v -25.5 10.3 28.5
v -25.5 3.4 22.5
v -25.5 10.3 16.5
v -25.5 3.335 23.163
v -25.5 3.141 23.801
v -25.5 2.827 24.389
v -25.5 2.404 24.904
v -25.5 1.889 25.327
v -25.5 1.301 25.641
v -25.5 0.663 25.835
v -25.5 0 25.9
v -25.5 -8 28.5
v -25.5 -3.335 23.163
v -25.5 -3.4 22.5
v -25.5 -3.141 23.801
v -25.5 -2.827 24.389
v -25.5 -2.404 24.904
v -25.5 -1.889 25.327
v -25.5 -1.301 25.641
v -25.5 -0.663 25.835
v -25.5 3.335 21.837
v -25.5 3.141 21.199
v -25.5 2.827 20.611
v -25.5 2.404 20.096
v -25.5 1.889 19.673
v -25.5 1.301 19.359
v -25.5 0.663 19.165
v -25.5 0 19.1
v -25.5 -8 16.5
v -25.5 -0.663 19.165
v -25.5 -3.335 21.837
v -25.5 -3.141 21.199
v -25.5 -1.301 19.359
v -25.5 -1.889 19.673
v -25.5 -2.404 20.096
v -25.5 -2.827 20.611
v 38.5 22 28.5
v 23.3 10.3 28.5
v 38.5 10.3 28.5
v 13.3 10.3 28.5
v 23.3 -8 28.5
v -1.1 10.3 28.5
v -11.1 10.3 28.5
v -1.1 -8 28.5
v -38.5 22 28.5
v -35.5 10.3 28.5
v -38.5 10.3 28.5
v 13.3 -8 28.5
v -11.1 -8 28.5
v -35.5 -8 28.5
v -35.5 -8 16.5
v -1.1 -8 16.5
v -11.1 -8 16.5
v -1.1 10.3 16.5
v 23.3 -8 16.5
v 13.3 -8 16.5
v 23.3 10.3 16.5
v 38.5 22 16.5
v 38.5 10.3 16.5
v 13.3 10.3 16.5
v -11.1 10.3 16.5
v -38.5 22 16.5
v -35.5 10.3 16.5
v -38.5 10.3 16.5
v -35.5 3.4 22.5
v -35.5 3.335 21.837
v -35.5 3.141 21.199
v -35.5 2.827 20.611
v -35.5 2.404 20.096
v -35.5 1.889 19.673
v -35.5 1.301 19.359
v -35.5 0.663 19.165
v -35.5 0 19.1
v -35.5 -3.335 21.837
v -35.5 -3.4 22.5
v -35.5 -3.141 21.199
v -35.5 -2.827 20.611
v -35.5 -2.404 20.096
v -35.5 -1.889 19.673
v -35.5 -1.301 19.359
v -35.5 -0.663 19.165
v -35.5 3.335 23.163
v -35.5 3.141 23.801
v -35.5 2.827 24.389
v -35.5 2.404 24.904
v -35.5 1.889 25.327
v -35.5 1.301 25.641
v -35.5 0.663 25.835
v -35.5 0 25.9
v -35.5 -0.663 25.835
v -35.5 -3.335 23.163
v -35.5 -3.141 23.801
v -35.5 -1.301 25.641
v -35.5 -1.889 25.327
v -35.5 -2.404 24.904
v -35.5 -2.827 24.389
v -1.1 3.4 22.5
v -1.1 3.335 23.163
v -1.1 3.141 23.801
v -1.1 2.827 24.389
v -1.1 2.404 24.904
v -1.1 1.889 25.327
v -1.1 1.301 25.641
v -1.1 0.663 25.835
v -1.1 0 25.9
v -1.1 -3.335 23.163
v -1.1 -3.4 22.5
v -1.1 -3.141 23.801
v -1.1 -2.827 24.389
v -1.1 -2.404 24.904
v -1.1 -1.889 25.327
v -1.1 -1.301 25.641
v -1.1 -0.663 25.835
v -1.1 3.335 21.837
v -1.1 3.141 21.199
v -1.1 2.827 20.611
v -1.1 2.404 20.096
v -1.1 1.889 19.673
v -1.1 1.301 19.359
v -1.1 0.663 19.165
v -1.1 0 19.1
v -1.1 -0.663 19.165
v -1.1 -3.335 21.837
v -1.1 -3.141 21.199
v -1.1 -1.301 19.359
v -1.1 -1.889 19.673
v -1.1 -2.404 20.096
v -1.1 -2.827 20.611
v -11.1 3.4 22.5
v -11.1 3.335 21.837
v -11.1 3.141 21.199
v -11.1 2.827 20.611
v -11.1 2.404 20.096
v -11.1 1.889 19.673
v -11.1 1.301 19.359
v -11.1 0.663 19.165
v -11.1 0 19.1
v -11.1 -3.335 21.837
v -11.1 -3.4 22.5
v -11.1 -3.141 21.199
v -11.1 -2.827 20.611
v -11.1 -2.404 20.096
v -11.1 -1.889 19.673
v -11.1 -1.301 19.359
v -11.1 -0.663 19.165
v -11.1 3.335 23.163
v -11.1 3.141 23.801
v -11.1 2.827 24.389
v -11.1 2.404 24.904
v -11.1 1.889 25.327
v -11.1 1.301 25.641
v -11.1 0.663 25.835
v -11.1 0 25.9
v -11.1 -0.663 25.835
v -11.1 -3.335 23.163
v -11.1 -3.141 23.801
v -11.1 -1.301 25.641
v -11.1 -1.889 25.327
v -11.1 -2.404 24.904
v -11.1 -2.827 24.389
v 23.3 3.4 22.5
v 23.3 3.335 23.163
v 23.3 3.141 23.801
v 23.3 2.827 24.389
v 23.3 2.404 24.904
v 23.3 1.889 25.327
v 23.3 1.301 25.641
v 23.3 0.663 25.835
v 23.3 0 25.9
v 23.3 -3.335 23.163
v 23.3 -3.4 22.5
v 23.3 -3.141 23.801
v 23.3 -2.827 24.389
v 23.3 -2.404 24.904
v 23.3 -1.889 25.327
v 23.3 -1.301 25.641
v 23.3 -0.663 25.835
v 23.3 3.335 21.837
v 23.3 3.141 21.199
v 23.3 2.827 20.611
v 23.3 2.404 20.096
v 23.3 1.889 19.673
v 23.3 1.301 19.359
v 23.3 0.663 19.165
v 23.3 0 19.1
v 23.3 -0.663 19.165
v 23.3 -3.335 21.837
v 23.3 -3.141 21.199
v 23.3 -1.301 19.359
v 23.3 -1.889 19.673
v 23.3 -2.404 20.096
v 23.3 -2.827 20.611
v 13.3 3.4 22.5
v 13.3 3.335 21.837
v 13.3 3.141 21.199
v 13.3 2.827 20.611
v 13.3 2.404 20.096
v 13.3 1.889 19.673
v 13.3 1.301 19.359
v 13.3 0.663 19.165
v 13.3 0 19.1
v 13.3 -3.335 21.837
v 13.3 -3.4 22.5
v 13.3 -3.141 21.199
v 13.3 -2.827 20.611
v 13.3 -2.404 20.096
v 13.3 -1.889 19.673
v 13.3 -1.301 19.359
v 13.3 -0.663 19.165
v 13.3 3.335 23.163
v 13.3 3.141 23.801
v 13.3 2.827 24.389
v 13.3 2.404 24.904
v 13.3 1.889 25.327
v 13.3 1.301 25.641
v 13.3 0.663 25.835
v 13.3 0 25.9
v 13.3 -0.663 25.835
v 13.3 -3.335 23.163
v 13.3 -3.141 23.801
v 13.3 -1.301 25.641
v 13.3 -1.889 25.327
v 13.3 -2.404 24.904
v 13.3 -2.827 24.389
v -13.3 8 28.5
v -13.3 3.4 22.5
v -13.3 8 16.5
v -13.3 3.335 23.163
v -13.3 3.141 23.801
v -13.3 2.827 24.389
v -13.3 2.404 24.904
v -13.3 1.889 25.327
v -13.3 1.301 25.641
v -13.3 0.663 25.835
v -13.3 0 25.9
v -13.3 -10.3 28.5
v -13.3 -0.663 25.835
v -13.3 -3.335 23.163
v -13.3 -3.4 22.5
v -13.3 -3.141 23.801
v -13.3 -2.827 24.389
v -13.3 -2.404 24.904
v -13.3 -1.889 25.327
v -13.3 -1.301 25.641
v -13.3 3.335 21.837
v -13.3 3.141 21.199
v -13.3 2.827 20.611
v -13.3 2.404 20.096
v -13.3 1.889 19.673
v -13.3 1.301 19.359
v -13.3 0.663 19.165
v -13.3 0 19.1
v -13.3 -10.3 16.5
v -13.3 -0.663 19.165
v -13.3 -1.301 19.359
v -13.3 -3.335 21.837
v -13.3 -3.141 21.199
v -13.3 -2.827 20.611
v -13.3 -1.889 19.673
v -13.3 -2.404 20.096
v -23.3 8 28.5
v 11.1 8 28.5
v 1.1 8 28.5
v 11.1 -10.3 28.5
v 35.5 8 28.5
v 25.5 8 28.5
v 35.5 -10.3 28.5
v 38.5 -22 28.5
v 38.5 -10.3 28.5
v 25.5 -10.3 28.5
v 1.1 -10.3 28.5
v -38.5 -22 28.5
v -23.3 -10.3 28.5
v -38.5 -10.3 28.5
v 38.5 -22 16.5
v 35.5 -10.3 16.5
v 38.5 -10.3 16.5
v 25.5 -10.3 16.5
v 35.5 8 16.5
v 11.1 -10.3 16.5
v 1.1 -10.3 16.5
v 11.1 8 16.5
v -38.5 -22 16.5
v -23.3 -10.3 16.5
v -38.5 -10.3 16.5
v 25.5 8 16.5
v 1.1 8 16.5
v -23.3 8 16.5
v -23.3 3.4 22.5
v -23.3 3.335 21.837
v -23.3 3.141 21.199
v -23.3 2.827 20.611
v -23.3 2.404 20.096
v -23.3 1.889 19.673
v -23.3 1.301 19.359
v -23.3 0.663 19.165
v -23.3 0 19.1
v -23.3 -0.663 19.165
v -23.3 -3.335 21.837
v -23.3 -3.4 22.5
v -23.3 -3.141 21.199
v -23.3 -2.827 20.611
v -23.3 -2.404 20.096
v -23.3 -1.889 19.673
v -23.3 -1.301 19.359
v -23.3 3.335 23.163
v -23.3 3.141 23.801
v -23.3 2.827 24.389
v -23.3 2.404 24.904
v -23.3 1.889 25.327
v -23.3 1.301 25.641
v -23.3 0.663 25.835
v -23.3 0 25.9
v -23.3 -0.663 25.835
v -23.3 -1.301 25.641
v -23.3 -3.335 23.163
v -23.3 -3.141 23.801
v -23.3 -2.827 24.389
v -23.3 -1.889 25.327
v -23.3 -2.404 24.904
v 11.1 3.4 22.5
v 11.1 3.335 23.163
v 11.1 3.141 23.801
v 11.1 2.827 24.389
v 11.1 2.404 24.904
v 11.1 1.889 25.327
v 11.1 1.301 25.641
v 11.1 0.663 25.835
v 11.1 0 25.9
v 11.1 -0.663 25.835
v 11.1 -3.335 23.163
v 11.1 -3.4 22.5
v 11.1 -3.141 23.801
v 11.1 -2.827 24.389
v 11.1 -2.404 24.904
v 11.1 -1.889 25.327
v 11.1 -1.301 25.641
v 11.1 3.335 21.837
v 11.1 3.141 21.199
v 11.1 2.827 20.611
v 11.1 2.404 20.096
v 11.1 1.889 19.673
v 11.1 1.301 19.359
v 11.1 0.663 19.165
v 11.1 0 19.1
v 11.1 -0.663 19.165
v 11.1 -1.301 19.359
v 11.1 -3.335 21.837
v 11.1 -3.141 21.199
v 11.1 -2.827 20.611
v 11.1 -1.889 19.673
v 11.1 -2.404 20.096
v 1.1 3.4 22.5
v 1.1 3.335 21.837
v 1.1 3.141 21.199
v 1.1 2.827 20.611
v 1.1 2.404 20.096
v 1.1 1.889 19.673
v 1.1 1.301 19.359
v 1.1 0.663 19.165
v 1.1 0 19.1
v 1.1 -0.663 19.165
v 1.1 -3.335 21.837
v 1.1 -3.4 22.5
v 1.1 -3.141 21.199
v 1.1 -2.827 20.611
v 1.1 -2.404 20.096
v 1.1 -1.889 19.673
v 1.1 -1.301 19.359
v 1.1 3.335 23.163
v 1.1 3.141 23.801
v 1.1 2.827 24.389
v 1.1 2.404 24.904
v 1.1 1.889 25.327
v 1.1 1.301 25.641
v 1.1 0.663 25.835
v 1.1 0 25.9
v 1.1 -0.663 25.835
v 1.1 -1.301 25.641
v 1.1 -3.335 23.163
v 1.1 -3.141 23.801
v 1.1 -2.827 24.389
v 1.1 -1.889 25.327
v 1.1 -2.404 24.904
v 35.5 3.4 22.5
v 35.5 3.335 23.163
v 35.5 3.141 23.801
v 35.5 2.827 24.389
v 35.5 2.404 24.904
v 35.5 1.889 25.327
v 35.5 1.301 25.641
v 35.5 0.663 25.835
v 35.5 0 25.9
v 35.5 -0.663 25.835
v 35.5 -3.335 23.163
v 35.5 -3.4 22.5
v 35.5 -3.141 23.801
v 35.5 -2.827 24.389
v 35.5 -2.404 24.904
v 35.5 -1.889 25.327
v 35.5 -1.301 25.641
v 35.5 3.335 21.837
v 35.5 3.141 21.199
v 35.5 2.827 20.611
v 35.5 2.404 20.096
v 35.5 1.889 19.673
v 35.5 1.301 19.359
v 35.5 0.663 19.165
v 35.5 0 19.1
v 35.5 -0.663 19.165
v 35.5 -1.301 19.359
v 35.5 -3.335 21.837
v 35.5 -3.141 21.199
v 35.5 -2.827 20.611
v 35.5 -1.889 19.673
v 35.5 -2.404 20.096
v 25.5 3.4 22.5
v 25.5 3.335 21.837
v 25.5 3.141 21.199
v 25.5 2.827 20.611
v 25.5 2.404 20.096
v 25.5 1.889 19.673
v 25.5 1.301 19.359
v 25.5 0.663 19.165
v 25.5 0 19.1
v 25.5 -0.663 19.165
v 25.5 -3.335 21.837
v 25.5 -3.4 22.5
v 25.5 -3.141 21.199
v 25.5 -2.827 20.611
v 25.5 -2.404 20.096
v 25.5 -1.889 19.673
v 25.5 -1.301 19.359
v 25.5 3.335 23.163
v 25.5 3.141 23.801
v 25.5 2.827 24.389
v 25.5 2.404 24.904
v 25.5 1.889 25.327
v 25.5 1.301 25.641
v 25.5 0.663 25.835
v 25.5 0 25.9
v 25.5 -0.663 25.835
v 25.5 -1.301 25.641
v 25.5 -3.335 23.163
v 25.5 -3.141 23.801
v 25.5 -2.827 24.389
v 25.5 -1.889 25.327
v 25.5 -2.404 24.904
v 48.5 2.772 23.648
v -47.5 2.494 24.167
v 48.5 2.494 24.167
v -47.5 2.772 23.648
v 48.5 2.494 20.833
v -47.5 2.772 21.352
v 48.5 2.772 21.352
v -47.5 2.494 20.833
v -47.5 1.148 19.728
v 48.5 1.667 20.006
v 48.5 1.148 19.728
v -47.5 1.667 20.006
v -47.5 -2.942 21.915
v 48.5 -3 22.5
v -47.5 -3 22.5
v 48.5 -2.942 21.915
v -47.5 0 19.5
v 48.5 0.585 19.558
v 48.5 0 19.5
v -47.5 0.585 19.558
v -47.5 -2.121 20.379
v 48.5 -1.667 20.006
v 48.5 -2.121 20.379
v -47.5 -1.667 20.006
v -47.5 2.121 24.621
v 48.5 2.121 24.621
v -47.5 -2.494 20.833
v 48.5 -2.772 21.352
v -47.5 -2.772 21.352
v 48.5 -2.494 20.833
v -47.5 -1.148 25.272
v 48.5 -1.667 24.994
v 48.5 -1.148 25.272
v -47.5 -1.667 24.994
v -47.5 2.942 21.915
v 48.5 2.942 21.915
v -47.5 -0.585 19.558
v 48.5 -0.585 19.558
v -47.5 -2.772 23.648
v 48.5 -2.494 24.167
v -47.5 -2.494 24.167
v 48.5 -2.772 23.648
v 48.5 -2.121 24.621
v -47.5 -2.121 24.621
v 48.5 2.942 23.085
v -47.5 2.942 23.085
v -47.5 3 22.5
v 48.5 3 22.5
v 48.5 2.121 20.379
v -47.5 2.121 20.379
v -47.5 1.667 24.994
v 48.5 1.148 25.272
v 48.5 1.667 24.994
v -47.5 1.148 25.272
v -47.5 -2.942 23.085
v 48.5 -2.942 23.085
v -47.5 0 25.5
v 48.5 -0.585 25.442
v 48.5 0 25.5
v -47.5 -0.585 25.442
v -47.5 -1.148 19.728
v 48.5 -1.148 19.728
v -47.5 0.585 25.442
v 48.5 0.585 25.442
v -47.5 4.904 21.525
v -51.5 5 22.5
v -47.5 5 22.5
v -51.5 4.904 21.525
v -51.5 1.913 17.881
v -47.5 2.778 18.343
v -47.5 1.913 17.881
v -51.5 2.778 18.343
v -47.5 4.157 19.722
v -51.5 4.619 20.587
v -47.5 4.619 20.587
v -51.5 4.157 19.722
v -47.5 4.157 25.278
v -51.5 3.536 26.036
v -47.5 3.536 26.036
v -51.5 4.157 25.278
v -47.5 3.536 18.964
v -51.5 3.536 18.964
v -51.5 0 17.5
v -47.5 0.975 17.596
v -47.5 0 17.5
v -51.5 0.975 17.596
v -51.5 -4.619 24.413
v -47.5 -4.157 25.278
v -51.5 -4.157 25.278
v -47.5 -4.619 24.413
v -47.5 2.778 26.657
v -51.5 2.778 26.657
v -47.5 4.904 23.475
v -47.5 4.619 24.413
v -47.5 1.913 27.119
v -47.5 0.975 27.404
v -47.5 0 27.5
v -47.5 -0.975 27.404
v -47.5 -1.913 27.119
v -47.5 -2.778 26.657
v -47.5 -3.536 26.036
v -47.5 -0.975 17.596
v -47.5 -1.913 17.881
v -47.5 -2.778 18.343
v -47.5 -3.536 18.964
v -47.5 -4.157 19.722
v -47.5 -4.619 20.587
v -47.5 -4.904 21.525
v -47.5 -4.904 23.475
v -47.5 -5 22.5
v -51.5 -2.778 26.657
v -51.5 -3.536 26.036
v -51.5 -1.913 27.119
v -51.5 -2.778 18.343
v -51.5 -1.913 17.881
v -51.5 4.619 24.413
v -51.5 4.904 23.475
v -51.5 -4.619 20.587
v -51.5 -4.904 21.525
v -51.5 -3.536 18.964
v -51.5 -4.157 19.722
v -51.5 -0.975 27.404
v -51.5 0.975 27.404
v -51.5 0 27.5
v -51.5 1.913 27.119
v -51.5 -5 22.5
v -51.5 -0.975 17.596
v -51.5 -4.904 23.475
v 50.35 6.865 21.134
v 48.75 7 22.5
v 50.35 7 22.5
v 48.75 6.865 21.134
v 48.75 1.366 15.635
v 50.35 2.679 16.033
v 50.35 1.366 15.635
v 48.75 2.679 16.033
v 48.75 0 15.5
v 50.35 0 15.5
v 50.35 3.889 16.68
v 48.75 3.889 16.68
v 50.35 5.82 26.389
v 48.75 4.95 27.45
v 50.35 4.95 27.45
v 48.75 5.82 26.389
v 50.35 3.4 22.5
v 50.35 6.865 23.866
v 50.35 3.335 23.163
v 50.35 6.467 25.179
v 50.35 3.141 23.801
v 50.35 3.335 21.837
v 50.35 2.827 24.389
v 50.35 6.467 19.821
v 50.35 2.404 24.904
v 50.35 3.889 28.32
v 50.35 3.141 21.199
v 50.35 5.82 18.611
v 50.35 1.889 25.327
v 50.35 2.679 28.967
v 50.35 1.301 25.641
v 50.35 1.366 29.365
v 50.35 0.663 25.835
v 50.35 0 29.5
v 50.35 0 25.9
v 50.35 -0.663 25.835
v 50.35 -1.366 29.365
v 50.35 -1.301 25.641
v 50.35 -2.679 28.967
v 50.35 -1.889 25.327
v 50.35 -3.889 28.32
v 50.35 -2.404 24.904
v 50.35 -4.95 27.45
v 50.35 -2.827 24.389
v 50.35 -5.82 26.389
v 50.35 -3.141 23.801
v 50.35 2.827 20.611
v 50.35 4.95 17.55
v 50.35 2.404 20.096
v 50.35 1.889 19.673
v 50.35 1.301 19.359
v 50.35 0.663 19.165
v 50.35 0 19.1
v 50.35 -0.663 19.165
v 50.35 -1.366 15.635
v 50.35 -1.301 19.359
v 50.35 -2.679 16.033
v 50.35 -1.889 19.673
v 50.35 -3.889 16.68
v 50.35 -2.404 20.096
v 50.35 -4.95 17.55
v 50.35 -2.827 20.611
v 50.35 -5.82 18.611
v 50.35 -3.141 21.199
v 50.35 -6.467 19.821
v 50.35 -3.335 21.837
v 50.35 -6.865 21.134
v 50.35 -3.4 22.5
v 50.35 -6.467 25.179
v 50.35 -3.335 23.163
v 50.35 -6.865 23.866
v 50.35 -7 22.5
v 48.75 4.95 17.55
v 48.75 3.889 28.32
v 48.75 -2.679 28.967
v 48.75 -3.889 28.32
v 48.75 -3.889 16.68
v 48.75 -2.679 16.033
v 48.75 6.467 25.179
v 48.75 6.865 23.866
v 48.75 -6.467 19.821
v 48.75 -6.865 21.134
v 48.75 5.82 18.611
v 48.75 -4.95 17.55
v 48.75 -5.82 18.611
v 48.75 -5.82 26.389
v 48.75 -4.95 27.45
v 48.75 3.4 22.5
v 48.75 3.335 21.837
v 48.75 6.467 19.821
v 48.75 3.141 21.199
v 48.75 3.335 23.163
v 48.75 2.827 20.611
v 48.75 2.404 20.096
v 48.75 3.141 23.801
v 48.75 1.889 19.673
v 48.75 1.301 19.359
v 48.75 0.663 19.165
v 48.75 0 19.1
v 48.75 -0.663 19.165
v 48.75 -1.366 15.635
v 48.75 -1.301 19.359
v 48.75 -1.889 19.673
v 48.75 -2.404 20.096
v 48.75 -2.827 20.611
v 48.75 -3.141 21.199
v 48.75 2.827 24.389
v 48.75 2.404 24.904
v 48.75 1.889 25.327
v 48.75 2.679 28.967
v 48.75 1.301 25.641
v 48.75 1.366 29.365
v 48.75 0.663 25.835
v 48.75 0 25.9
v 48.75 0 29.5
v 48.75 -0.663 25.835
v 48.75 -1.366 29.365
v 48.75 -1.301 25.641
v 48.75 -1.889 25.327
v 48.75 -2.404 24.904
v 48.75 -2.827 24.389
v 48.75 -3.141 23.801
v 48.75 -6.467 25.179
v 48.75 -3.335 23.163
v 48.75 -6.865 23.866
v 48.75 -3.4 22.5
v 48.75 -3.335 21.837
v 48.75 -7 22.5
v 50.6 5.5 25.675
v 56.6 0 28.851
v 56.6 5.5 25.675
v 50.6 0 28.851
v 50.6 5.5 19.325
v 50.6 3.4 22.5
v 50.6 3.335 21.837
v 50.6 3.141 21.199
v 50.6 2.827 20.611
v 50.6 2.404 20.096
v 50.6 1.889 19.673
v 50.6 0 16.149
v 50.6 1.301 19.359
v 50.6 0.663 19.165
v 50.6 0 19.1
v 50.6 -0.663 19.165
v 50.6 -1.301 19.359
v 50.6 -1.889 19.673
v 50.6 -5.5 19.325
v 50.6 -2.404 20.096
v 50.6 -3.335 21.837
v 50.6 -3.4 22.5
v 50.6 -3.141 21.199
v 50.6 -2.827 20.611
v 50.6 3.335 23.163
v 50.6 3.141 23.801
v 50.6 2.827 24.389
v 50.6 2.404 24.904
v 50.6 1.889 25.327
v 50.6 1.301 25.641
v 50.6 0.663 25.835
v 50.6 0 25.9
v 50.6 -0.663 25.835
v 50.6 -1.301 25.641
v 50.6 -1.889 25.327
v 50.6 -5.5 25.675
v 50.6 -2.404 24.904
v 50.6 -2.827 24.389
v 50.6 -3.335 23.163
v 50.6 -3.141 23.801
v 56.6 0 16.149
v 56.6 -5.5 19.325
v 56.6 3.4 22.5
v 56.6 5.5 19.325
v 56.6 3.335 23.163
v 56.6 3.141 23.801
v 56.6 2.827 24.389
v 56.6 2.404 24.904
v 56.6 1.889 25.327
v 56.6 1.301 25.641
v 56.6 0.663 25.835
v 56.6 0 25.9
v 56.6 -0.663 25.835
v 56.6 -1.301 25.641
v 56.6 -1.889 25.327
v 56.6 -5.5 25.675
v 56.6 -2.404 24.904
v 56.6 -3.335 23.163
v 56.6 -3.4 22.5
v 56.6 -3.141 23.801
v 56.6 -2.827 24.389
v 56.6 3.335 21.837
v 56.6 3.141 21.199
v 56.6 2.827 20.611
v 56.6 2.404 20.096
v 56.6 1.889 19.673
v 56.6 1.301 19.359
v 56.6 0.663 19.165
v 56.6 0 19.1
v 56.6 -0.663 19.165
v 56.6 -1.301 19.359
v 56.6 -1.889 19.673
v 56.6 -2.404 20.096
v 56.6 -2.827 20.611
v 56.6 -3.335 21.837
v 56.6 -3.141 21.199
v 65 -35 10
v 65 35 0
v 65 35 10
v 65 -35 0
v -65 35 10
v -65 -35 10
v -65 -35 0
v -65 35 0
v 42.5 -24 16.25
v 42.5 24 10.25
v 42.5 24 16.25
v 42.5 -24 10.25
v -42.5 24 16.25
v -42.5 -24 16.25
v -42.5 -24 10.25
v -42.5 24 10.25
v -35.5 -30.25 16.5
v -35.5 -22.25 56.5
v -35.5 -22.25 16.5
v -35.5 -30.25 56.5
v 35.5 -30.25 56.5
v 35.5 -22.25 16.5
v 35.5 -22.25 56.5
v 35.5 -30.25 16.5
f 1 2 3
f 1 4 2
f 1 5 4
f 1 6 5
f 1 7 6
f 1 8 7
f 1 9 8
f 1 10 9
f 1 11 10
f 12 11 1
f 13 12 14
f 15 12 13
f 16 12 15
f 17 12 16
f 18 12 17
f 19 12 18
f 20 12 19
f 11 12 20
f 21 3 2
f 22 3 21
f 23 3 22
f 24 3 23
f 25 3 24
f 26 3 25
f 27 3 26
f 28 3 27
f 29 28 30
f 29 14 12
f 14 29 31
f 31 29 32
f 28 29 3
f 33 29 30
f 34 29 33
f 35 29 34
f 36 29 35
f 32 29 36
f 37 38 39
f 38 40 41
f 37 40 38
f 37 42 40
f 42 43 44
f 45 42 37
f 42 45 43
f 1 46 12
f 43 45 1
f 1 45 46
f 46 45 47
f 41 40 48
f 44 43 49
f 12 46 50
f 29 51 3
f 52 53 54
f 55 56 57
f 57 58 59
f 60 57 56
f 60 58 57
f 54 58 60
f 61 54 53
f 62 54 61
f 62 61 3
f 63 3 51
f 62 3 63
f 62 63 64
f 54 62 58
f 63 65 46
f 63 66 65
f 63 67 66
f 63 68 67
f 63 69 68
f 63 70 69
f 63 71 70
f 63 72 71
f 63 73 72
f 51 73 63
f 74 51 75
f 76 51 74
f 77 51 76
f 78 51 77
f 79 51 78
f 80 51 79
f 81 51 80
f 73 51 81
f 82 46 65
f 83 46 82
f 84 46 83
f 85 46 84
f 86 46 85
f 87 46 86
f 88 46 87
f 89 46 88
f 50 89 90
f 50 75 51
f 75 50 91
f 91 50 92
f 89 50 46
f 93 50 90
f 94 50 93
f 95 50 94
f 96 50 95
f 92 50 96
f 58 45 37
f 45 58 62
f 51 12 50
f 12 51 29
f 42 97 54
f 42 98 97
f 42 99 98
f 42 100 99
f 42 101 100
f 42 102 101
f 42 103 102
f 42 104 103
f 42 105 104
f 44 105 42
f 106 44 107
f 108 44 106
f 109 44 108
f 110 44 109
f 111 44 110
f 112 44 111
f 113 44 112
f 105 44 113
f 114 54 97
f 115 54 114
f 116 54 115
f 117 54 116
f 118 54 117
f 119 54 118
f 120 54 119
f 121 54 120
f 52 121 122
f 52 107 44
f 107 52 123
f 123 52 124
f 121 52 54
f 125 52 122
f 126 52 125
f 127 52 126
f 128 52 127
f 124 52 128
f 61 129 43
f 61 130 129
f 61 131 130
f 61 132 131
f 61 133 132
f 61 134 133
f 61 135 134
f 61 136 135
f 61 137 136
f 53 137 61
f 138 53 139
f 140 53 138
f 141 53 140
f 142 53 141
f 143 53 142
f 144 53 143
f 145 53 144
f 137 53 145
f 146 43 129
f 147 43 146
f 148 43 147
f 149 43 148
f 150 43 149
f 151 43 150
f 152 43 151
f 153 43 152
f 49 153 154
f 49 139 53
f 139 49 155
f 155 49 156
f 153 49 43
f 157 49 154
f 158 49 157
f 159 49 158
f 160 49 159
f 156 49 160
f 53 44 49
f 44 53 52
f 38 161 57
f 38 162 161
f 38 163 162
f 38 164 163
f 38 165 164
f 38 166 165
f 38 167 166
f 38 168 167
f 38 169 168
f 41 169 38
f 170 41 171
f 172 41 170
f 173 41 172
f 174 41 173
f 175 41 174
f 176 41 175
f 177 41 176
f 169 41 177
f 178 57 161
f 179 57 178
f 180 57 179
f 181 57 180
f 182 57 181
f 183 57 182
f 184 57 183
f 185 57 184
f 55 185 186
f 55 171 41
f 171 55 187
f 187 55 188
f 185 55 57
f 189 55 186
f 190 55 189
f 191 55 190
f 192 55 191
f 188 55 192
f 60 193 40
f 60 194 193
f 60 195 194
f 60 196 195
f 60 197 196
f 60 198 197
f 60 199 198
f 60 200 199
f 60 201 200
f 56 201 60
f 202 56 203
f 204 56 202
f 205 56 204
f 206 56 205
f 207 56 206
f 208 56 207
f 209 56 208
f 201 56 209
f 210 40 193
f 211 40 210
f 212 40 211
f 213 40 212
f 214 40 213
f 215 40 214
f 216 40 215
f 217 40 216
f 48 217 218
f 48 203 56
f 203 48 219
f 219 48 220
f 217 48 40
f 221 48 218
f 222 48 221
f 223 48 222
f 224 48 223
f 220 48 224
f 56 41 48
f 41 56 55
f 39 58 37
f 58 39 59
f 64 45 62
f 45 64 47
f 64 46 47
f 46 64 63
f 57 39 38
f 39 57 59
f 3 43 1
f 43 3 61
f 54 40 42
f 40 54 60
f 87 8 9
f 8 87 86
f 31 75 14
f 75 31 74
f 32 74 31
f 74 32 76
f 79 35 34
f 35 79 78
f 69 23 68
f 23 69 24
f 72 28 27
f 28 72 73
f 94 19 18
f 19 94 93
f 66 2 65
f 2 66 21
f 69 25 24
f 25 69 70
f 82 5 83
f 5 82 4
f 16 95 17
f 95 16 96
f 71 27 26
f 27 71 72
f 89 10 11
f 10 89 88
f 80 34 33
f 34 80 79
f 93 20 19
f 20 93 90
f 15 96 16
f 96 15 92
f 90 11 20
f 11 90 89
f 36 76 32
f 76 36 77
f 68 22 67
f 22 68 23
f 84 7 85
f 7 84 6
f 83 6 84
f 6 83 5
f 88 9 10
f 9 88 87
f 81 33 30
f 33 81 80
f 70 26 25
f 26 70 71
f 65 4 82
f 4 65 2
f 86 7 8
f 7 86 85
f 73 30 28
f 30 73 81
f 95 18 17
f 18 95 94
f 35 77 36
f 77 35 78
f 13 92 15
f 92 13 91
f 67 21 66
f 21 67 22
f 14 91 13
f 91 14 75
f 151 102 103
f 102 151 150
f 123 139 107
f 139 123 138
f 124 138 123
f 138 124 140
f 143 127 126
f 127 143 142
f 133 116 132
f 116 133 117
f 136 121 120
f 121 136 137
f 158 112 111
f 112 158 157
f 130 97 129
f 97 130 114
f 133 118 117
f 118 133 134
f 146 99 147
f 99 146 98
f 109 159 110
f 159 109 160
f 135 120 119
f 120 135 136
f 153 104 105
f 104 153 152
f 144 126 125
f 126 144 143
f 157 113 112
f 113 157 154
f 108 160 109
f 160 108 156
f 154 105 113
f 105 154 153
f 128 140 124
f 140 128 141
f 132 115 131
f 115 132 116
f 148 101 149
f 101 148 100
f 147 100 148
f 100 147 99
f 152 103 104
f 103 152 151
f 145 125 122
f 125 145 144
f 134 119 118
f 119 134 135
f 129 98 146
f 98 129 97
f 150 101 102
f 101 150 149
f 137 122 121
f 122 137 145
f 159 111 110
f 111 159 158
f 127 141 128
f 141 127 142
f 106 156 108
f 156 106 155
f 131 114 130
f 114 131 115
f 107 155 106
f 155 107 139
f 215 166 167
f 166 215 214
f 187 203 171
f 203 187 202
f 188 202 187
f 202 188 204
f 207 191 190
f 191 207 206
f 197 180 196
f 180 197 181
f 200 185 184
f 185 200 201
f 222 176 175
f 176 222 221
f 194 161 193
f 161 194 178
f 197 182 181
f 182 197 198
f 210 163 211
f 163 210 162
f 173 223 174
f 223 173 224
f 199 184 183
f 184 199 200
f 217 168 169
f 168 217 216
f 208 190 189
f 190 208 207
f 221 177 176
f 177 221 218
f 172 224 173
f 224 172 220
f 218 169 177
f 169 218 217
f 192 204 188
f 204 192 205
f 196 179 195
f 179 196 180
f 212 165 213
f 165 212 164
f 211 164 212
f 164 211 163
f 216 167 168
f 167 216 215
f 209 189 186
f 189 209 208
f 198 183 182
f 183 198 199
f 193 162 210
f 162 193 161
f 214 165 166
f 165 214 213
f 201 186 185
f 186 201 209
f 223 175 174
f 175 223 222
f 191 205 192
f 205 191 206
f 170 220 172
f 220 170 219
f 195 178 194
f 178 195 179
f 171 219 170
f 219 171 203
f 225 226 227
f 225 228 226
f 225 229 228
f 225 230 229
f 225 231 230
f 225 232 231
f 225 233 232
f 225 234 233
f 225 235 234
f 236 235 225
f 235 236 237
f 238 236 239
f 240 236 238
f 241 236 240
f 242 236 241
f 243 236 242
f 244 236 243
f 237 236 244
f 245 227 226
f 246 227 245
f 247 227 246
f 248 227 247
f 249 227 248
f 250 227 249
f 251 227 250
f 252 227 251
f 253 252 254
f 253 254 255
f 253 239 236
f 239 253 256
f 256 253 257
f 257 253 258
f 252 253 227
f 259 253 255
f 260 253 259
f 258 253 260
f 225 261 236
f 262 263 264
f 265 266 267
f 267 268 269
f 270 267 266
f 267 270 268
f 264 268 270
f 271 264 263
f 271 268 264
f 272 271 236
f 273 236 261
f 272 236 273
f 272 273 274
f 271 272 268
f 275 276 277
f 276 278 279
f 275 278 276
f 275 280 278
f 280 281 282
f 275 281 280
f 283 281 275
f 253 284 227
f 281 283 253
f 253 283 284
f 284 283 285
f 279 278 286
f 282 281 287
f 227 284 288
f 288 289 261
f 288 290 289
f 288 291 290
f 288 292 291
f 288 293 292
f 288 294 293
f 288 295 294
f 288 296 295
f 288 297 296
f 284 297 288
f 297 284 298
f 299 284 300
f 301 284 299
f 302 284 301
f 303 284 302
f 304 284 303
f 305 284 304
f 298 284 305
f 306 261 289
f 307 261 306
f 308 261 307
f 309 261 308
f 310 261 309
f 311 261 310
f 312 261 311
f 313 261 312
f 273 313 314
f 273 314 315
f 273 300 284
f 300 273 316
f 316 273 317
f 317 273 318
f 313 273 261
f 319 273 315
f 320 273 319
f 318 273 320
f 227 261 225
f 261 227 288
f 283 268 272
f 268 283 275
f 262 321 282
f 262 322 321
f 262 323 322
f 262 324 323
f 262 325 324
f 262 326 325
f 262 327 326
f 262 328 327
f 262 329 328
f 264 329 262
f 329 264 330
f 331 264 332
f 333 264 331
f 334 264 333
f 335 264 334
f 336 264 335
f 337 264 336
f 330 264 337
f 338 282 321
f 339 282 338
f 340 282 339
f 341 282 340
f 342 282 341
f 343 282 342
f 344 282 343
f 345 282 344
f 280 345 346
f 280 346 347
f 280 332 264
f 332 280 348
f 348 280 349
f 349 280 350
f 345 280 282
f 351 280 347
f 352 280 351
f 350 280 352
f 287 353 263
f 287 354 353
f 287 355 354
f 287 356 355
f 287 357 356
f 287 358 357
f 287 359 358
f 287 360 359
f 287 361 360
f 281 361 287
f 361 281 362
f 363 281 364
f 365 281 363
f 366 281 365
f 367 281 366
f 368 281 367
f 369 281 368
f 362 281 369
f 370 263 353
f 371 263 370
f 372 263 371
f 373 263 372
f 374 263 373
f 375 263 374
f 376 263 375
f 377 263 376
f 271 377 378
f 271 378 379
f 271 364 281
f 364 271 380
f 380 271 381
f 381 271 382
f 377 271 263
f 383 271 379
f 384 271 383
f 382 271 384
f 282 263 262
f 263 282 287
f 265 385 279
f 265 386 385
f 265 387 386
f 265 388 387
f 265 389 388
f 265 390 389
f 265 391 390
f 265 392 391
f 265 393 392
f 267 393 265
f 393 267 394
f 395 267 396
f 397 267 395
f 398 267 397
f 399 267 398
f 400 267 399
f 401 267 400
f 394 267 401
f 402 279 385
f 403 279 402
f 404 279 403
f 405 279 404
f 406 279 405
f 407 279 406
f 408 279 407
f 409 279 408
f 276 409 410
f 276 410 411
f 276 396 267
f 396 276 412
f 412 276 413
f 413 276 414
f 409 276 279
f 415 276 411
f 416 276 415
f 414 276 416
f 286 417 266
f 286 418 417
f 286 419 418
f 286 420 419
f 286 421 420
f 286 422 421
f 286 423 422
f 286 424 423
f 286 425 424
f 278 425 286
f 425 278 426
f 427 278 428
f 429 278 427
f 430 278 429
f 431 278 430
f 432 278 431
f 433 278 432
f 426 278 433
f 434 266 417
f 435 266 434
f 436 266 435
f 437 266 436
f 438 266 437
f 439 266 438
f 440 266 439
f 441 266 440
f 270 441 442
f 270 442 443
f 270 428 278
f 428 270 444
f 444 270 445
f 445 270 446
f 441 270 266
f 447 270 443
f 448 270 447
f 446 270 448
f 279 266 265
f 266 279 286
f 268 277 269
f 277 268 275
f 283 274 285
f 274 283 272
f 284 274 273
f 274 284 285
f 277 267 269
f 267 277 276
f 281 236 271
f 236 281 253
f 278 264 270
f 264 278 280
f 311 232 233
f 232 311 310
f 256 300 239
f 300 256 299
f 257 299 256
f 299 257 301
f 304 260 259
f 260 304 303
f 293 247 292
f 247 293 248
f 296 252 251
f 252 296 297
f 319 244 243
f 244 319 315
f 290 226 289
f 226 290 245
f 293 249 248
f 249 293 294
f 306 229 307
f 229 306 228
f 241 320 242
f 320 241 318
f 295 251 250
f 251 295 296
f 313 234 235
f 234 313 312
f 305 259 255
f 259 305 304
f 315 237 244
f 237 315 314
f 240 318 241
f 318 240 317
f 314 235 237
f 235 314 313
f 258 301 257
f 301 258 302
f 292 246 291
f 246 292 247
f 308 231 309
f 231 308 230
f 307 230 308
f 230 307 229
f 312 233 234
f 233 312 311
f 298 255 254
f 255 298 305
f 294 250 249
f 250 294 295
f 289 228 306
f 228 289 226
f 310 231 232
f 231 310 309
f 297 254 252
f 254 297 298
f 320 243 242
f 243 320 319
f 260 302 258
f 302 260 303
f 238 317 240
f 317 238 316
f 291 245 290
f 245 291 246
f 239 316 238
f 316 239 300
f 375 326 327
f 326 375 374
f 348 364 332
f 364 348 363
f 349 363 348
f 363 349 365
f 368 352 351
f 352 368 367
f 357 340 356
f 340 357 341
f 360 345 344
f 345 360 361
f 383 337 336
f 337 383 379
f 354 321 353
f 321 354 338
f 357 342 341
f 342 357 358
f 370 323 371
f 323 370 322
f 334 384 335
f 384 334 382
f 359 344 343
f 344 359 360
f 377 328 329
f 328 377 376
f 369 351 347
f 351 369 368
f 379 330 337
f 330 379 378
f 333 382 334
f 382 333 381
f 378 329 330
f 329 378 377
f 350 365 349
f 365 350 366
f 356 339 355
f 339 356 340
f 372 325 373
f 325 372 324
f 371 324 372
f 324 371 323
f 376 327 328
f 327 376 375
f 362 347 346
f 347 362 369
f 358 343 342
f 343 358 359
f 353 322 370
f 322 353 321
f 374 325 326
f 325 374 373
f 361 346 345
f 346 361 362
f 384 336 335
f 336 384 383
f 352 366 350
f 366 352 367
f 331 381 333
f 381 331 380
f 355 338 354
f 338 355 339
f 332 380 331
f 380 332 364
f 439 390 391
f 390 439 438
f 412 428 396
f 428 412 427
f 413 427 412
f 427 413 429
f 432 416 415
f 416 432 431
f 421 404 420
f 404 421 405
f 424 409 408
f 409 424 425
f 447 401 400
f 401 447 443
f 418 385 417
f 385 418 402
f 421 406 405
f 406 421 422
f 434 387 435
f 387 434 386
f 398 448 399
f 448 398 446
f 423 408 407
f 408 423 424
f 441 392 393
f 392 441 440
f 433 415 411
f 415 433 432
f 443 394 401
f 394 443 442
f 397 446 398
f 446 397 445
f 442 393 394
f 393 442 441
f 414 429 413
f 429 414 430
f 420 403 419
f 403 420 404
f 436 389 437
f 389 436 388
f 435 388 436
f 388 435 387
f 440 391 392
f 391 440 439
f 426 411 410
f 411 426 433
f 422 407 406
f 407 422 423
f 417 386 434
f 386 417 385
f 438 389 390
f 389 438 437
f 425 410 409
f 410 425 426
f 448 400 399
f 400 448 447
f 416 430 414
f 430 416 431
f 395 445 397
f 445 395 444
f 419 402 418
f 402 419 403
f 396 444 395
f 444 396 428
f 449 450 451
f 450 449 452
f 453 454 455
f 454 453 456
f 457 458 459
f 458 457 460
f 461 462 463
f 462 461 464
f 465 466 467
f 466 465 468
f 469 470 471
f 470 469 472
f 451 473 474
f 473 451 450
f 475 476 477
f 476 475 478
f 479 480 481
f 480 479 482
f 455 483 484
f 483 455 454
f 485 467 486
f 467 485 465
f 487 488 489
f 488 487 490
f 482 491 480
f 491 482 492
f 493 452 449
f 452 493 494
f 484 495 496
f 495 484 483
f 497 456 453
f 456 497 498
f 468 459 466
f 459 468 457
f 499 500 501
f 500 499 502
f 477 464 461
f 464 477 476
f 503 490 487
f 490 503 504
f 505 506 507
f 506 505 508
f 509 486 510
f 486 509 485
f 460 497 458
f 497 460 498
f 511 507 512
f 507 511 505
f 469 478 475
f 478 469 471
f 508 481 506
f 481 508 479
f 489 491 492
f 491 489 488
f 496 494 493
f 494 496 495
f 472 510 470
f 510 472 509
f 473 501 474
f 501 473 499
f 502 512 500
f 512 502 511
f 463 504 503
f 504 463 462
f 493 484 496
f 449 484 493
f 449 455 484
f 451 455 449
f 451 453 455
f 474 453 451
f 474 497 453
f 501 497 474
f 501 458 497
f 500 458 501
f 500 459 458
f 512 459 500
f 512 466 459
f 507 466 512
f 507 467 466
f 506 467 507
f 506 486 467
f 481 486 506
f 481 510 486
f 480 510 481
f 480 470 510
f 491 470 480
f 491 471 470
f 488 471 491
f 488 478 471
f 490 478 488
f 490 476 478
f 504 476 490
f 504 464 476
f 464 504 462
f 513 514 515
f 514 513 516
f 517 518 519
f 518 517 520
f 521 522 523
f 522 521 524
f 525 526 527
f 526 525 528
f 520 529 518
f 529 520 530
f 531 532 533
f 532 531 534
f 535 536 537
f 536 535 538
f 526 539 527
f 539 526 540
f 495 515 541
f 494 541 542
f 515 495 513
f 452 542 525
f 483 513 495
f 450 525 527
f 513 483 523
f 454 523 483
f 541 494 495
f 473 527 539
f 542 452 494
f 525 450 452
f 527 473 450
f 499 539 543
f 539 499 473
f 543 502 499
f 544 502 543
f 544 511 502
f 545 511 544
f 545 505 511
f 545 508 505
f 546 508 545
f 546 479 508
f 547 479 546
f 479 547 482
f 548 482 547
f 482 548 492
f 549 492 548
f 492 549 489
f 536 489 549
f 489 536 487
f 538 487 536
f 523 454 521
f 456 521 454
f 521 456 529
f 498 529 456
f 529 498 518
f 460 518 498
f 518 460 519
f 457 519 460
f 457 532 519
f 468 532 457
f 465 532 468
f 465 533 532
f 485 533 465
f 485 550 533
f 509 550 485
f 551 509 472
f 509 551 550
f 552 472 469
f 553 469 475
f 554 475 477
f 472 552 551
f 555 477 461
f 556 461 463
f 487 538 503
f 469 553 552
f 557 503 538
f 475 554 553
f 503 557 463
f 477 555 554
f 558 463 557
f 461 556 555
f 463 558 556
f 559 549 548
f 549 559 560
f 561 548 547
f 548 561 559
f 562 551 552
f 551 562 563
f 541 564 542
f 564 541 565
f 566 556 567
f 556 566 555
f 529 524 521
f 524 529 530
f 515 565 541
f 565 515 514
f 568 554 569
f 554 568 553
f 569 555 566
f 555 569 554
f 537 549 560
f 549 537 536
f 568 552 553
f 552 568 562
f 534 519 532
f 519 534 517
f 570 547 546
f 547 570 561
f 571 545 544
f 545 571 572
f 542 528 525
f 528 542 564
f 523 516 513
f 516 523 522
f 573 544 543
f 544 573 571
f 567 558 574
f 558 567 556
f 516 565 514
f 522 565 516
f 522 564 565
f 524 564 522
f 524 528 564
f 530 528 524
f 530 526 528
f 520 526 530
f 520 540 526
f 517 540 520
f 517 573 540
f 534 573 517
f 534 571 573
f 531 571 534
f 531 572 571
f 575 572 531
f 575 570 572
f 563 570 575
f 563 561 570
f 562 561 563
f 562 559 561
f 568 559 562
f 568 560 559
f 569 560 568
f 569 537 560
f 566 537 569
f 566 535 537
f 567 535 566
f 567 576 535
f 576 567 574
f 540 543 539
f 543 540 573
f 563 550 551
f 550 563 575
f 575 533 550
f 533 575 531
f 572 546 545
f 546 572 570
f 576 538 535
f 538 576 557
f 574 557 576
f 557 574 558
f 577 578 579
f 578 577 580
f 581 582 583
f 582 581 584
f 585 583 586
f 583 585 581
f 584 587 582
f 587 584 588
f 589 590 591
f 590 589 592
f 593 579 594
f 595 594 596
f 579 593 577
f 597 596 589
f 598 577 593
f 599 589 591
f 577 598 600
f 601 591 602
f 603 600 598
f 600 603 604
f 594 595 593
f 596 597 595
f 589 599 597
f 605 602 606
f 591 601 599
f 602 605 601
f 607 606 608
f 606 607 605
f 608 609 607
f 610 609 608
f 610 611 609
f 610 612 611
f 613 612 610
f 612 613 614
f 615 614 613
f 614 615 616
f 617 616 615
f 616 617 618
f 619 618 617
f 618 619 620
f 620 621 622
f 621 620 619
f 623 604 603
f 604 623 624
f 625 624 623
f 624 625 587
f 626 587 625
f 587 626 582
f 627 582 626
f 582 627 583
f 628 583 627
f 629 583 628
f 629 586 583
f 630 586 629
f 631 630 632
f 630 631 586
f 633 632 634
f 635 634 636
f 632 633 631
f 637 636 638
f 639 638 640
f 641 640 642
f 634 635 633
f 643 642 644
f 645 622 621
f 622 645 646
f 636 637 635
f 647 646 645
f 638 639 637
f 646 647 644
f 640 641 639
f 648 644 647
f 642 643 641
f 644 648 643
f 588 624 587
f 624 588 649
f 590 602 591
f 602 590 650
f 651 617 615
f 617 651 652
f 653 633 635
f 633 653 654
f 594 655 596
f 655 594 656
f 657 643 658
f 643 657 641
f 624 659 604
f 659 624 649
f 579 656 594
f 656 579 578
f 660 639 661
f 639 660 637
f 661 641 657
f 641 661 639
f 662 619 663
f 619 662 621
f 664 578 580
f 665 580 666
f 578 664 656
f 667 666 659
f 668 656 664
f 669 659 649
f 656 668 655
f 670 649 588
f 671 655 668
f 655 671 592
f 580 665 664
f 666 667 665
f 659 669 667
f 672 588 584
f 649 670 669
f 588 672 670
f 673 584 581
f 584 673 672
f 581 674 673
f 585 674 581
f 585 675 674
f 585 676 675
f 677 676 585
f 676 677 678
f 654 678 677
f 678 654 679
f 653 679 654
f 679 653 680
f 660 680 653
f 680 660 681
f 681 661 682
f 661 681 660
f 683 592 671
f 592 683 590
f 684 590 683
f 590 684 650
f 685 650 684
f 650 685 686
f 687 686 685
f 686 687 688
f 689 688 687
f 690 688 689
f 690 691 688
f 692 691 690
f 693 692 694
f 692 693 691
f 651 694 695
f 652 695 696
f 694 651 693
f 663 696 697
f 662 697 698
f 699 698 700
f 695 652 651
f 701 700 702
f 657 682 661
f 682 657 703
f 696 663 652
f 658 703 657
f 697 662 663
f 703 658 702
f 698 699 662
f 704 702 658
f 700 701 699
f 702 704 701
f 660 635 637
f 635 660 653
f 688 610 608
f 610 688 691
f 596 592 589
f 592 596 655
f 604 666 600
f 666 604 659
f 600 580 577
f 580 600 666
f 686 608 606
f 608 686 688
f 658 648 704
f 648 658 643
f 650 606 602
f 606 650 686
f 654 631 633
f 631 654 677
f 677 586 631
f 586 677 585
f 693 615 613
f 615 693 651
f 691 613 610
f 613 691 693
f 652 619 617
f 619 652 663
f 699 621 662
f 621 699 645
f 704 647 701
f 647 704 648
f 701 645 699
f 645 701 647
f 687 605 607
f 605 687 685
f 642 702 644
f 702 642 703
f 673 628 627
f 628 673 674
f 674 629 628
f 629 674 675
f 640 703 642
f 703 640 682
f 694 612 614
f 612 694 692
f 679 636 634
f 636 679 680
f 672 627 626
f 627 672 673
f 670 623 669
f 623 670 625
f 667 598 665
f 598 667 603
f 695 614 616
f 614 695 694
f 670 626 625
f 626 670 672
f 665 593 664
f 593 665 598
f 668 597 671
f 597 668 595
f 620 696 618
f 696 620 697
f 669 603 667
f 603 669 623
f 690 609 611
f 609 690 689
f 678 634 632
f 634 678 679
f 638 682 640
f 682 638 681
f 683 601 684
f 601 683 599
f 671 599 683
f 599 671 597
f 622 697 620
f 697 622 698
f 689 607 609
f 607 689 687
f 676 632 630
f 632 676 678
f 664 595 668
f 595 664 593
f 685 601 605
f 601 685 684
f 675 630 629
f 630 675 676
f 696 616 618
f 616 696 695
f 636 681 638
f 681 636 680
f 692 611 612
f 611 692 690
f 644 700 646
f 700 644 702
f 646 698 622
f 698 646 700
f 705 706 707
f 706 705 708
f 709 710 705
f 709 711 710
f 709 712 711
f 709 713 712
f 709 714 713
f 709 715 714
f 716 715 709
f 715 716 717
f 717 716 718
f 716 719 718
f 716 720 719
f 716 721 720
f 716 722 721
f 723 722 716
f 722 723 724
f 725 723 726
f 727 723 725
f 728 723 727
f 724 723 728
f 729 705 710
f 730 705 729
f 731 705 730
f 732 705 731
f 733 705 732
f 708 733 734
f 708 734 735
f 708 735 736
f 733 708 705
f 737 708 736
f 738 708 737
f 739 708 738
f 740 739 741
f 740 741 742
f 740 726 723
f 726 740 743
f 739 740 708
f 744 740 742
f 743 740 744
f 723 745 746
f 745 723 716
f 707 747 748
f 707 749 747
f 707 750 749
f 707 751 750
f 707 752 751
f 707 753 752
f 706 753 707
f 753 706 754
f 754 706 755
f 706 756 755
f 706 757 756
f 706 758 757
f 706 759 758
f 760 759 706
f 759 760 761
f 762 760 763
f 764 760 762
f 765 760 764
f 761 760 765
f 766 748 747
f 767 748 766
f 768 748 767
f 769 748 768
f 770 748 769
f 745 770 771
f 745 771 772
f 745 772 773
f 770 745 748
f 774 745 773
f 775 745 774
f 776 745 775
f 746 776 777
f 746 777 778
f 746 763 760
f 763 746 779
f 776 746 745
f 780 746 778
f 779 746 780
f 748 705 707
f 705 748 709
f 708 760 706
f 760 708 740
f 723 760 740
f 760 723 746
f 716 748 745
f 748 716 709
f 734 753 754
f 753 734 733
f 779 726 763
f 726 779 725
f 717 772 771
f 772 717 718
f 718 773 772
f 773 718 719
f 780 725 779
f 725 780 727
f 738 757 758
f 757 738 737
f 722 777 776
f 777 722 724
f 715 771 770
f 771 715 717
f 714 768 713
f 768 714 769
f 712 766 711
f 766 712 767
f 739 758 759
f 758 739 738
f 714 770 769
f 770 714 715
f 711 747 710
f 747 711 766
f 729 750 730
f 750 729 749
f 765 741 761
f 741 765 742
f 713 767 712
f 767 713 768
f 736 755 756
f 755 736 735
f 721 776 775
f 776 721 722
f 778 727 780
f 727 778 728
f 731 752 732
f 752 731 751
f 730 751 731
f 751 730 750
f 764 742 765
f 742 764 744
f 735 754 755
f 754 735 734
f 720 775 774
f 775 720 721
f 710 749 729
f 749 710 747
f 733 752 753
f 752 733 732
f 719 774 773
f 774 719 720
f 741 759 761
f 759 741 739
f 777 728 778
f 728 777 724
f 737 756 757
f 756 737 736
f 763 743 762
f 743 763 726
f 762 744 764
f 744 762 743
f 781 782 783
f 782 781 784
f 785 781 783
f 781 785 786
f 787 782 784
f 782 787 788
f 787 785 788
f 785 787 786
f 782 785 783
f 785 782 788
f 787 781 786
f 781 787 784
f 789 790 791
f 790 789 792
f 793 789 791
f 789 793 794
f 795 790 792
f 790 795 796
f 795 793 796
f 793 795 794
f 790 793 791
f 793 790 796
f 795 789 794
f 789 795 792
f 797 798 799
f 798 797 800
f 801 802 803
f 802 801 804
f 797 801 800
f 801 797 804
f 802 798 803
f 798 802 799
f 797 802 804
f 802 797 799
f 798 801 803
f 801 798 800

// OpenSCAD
$fn = 32;

// ------------------------------------------------------------------------
// Comb hinge with flap: leaf 77 x 22 mm, pin d6, flap 40 mm
// Every part is its own module, assembly() places every instance.
// ------------------------------------------------------------------------

// --- part 1 ---
module hinge_bed() {
  difference() {
    translate([-65, -35, 0]) cube([130, 70, 10]);
  }
}

// --- part 2 ---
module hinge_riser() {
  difference() {
    translate([-42.5, -24, 0]) cube([85, 48, 6]);
  }
}

// --- part 3 ---
module hinge_leaf_a() {
  difference() {
    union() {
      translate([-35.5, -8, -6]) cube([10, 30, 12]);
      translate([-11.1, -8, -6]) cube([10, 30, 12]);
      translate([13.3, -8, -6]) cube([10, 30, 12]);
      translate([-38.5, 10.3, -6]) cube([77, 11.7, 12]);
    }
    translate([-30.5, 0, 0]) rotate([0, 90, 0]) cylinder(h = 12, d = 6.8, center = true);
    translate([-6.1, 0, 0]) rotate([0, 90, 0]) cylinder(h = 12, d = 6.8, center = true);
    translate([18.3, 0, 0]) rotate([0, 90, 0]) cylinder(h = 12, d = 6.8, center = true);
  }
}

// --- part 4 ---
module hinge_leaf_b() {
  difference() {
    union() {
      translate([-23.3, -22, -6]) cube([10, 30, 12]);
      translate([1.1, -22, -6]) cube([10, 30, 12]);
      translate([25.5, -22, -6]) cube([10, 30, 12]);
      translate([-38.5, -22, -6]) cube([77, 11.7, 12]);
    }
    translate([-18.3, 0, 0]) rotate([0, 90, 0]) cylinder(h = 12, d = 6.8, center = true);
    translate([6.1, 0, 0]) rotate([0, 90, 0]) cylinder(h = 12, d = 6.8, center = true);
    translate([30.5, 0, 0]) rotate([0, 90, 0]) cylinder(h = 12, d = 6.8, center = true);
  }
}

// --- part 5 ---
module hinge_flap() {
  difference() {
    translate([-35.5, -20, 0]) cube([71, 40, 8]);
  }
}

// --- part 6 ---
module hinge_pin() {
  rotate([0, 90, 0]) cylinder(h = 97, d = 6, center = true);
  translate([-51.5, 0, 0]) rotate([0, 90, 0]) cylinder(h = 4, d = 10);
}

// --- part 7 ---
module pin_washer() {
  difference() {
      translate([0, 0, 0]) cylinder(h = 1.6, d = 14);
      translate([0, 0, -1]) cylinder(h = 3.6, d = 6.8);
    }
}

// --- part 8 ---
module pin_nut() {
  difference() {
    linear_extrude(height = 6) polygon(points = [[6.351, 0], [3.175, 5.5], [-3.175, 5.5], [-6.351, 0], [-3.175, -5.5], [3.175, -5.5]]);
    translate([0, 0, -1]) cylinder(h = 8, d = 6.8);
  }
}

// --- assembly ---
module assembly() {
  color([0.80, 0.24, 0.20]) translate([0, 0, 0]) rotate([0, 0, 0]) hinge_bed();
  color([0.20, 0.45, 0.75]) translate([0, 0, 10.25]) rotate([0, 0, 0]) hinge_riser();
  color([0.25, 0.62, 0.32]) translate([0, 0, 22.5]) rotate([0, 0, 0]) hinge_leaf_a();
  color([0.92, 0.70, 0.18]) translate([0, 0, 22.5]) rotate([0, 0, 0]) hinge_leaf_b();
  color([0.58, 0.35, 0.70]) translate([0, -22.25, 36.5]) rotate([90, 0, 0]) hinge_flap();
  color([0.16, 0.66, 0.66]) translate([0, 0, 22.5]) rotate([0, 0, 0]) hinge_pin();
  color([0.85, 0.48, 0.18]) translate([48.75, 0, 22.5]) rotate([0, 90, 0]) pin_washer();
  color([0.55, 0.60, 0.65]) translate([50.6, 0, 22.5]) rotate([0, 90, 0]) pin_nut();
}

assembly();
